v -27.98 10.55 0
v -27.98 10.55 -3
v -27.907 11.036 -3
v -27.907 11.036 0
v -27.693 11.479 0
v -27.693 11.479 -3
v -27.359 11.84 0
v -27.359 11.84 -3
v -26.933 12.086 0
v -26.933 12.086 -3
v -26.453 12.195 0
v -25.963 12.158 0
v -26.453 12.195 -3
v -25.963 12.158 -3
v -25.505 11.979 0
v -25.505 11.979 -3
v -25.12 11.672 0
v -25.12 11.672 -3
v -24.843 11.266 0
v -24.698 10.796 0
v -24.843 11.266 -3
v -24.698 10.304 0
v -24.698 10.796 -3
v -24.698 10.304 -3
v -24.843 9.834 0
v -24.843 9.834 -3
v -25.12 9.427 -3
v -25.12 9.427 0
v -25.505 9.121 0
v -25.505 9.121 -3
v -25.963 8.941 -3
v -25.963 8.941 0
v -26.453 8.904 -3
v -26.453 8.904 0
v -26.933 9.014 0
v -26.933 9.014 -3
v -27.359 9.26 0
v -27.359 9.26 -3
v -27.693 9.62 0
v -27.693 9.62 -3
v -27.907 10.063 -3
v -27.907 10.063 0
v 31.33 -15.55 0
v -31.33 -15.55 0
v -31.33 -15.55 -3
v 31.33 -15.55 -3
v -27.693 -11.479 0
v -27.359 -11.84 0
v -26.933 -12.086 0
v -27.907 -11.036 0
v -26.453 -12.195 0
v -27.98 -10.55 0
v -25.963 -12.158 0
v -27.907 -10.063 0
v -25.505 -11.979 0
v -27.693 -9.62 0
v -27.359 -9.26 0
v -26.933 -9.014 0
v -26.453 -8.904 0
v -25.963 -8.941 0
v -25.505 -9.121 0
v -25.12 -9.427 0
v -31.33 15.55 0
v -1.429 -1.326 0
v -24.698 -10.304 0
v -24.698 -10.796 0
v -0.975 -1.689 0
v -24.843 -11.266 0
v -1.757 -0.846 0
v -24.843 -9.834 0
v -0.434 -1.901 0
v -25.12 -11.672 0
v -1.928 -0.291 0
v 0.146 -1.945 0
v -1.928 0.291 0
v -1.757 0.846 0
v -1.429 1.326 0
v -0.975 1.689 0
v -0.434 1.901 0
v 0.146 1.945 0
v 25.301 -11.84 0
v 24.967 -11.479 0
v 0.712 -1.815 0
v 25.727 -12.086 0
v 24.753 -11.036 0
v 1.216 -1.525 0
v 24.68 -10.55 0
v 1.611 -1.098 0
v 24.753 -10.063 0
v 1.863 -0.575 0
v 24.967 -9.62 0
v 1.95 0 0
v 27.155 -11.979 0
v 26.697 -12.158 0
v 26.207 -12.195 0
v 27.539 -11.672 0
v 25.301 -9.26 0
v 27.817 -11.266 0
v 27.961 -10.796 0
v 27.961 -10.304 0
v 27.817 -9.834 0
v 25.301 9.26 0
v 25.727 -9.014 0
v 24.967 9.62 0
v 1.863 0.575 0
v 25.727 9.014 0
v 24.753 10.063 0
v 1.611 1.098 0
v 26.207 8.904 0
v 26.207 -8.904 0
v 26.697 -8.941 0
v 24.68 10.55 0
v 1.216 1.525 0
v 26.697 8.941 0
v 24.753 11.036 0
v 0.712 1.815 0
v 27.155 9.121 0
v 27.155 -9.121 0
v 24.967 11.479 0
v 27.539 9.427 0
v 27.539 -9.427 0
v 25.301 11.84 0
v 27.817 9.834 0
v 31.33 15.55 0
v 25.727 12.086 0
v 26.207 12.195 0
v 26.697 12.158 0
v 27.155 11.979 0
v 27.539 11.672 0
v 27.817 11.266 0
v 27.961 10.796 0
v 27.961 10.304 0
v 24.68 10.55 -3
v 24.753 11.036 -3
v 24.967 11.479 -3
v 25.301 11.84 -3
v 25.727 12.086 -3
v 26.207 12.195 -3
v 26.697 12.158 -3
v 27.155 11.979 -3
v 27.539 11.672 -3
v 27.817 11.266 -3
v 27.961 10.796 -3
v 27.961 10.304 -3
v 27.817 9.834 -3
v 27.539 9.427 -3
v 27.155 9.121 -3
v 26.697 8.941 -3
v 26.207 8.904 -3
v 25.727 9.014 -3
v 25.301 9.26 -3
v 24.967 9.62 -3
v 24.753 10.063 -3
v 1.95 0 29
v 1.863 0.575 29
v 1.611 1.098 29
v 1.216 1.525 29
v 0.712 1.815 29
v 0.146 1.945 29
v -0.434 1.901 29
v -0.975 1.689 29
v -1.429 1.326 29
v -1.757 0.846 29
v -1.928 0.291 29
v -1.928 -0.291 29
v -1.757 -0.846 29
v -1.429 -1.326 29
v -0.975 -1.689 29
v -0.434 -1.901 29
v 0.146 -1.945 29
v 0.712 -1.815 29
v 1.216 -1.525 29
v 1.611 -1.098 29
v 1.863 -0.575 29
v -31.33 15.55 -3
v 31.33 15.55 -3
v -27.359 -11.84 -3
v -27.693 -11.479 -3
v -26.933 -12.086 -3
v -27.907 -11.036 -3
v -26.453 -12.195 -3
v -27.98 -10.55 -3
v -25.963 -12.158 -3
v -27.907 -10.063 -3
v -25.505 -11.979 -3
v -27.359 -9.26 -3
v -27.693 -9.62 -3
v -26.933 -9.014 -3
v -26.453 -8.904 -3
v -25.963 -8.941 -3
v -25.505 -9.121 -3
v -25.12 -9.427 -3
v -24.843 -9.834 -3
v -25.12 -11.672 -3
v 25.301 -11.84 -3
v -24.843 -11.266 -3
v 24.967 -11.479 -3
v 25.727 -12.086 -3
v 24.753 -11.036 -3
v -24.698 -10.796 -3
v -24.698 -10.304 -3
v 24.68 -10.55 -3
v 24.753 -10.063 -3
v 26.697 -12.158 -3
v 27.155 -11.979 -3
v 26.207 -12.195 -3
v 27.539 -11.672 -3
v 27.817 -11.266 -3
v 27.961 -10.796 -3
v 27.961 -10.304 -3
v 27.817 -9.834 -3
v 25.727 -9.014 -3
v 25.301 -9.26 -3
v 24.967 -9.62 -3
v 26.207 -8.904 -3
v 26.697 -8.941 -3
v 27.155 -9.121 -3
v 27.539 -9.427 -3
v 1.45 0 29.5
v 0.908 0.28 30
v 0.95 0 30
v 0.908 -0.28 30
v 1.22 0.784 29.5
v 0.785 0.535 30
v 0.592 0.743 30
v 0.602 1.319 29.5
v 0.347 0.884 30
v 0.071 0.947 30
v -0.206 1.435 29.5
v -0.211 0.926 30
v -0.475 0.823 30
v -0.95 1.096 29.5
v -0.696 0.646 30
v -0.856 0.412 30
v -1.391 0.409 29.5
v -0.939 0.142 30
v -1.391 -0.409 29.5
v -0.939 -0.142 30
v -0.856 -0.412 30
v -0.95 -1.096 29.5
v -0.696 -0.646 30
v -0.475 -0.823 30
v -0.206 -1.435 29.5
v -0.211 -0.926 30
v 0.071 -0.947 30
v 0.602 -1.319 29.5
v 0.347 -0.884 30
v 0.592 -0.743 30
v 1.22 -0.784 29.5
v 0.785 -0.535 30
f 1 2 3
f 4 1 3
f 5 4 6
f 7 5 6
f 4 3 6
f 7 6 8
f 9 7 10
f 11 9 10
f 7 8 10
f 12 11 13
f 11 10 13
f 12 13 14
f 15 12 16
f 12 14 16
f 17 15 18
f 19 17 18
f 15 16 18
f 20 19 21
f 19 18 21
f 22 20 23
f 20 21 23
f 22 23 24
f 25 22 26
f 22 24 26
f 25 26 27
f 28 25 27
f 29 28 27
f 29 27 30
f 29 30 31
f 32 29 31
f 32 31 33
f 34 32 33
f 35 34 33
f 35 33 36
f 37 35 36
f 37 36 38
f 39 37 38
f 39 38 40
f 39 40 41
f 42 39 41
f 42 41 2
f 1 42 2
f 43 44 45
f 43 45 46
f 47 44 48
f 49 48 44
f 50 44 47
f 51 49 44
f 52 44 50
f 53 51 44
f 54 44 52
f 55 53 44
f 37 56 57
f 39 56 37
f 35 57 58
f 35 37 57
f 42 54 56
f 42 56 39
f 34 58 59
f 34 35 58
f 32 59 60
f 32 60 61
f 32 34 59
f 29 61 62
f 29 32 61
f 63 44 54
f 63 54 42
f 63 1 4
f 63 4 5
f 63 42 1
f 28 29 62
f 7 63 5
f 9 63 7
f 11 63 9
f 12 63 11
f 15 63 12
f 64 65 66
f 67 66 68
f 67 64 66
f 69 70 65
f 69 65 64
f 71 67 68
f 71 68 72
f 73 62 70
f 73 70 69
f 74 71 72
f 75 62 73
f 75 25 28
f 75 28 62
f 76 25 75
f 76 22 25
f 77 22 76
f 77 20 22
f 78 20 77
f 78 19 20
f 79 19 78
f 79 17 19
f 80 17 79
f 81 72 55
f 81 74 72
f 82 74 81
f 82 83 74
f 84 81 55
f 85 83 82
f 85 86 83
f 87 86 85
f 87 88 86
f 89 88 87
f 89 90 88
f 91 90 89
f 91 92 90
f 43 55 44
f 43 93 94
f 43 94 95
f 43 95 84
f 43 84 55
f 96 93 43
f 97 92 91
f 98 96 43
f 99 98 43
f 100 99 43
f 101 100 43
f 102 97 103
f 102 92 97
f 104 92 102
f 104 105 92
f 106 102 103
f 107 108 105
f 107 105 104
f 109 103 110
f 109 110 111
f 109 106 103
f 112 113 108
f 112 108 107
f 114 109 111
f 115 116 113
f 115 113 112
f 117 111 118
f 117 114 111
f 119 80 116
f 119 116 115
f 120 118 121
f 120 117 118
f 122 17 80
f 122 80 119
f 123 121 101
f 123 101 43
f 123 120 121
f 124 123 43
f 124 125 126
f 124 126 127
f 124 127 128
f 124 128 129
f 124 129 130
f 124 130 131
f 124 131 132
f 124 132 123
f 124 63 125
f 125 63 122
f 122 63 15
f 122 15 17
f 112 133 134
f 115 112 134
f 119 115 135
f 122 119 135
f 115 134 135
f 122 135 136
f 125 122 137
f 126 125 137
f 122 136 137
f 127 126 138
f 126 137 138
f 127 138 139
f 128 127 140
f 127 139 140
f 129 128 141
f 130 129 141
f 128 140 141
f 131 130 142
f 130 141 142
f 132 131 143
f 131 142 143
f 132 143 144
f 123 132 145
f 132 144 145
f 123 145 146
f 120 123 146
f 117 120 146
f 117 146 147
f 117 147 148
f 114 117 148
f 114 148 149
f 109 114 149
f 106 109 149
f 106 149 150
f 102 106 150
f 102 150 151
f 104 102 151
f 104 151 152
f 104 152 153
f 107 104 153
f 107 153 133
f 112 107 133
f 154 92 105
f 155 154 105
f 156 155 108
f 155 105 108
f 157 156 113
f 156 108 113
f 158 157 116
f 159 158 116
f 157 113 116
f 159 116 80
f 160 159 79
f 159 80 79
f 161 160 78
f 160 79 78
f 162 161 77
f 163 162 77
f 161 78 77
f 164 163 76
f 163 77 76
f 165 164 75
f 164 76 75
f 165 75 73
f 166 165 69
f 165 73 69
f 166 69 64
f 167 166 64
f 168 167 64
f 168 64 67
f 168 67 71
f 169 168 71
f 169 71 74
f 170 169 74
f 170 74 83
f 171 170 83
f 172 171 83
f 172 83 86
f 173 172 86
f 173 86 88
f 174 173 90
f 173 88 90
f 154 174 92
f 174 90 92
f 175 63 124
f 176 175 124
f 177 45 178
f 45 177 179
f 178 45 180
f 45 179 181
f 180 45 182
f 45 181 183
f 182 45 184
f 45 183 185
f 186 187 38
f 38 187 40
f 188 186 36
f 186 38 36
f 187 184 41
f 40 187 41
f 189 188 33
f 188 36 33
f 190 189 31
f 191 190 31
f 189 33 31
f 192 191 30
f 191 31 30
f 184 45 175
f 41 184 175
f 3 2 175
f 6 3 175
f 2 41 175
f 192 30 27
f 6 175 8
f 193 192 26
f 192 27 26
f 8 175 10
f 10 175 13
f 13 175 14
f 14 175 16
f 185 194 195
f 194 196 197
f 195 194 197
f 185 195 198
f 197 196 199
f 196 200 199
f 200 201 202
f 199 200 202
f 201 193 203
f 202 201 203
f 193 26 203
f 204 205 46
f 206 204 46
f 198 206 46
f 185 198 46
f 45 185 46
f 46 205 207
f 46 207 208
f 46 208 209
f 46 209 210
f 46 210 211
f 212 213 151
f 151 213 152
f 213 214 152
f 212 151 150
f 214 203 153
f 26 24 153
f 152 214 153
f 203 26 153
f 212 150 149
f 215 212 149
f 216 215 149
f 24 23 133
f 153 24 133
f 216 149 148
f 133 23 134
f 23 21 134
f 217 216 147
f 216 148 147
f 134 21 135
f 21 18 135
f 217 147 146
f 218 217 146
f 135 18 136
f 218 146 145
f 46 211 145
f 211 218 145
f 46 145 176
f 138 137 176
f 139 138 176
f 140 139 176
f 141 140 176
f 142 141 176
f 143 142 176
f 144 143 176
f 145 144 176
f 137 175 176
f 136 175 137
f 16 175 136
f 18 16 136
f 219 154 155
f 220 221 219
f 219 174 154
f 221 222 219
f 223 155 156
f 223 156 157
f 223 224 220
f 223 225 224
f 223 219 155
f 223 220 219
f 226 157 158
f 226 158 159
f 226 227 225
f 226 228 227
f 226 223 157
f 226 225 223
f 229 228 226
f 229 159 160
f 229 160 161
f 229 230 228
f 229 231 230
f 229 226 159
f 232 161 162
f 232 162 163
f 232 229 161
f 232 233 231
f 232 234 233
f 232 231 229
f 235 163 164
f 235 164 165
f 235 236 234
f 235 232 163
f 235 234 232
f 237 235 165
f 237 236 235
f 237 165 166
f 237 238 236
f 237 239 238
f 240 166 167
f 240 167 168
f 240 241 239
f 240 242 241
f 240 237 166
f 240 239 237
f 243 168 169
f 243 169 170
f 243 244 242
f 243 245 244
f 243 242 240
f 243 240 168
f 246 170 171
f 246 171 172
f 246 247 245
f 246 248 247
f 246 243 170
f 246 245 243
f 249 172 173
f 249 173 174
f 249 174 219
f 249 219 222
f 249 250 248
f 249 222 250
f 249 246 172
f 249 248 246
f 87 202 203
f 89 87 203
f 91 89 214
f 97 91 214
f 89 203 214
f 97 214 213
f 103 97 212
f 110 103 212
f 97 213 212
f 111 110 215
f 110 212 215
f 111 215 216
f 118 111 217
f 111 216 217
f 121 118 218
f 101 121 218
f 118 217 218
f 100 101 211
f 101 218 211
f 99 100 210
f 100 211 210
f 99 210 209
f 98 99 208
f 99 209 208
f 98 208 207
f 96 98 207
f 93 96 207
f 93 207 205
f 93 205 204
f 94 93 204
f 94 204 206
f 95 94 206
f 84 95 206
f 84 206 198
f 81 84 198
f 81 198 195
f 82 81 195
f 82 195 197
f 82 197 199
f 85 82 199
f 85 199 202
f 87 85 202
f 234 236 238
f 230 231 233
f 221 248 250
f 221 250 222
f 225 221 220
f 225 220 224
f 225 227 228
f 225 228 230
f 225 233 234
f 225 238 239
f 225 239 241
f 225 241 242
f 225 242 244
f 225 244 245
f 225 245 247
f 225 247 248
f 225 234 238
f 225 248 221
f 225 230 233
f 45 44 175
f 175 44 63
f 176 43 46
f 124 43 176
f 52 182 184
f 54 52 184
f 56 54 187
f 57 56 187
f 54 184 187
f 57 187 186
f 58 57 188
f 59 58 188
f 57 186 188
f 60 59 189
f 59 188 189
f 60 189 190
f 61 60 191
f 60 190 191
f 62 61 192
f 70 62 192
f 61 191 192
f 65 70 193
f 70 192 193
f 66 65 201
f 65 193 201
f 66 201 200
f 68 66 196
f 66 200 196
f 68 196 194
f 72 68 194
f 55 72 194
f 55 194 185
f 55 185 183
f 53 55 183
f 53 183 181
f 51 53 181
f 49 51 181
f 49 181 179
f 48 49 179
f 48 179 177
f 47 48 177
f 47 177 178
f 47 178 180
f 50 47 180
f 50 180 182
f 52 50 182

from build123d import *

# Parameters (mm, degrees)
F0_R     = 1.95
F1_DEPTH = 30
F2_SIZE  = 1
F0_W     = 62.6598149538
F0_H     = 31.0992728919
F0_R_2   = 15
F3_DEPTH = 3
F4_D     = 3.3
F4_DEPTH = 10
F4_TIP   = 0.9914200214


with BuildPart() as f1:
    # F0 (on Top) → F1 (new body)
    with BuildSketch(Plane.XY):
        Circle(F0_R)
    extrude(amount=F1_DEPTH)

    # F2
    f2_edges = [f1.edges().sort_by_distance(p)[0] for p in [
        (-1.95, 0, 30),
    ]]
    chamfer(f2_edges, length=F2_SIZE)

    # F0 (on Top) → F3 (join)
    with BuildSketch(Plane.XY):
        Rectangle(F0_W, F0_H)
        Circle(F0_R_2, mode=Mode.SUBTRACT)
        Circle(F0_R_2)
        Circle(F0_R, mode=Mode.SUBTRACT)
        Circle(F0_R)
    extrude(amount=-F3_DEPTH)

    # F4
    with Locations(Plane.XY):
        with Locations((-26.3299074769, 10.5496364459), (26.3299074769, 10.5496364459), (26.3299074769, -10.5496364459), (-26.3299074769, -10.5496364459)):
            Hole(F4_D / 2, depth=F4_DEPTH)
            with Locations((0, 0, -(F4_DEPTH + F4_TIP / 2))):  # 118° drill point
                Cone(0, F4_D / 2, F4_TIP, mode=Mode.SUBTRACT)


solid = f1.part
